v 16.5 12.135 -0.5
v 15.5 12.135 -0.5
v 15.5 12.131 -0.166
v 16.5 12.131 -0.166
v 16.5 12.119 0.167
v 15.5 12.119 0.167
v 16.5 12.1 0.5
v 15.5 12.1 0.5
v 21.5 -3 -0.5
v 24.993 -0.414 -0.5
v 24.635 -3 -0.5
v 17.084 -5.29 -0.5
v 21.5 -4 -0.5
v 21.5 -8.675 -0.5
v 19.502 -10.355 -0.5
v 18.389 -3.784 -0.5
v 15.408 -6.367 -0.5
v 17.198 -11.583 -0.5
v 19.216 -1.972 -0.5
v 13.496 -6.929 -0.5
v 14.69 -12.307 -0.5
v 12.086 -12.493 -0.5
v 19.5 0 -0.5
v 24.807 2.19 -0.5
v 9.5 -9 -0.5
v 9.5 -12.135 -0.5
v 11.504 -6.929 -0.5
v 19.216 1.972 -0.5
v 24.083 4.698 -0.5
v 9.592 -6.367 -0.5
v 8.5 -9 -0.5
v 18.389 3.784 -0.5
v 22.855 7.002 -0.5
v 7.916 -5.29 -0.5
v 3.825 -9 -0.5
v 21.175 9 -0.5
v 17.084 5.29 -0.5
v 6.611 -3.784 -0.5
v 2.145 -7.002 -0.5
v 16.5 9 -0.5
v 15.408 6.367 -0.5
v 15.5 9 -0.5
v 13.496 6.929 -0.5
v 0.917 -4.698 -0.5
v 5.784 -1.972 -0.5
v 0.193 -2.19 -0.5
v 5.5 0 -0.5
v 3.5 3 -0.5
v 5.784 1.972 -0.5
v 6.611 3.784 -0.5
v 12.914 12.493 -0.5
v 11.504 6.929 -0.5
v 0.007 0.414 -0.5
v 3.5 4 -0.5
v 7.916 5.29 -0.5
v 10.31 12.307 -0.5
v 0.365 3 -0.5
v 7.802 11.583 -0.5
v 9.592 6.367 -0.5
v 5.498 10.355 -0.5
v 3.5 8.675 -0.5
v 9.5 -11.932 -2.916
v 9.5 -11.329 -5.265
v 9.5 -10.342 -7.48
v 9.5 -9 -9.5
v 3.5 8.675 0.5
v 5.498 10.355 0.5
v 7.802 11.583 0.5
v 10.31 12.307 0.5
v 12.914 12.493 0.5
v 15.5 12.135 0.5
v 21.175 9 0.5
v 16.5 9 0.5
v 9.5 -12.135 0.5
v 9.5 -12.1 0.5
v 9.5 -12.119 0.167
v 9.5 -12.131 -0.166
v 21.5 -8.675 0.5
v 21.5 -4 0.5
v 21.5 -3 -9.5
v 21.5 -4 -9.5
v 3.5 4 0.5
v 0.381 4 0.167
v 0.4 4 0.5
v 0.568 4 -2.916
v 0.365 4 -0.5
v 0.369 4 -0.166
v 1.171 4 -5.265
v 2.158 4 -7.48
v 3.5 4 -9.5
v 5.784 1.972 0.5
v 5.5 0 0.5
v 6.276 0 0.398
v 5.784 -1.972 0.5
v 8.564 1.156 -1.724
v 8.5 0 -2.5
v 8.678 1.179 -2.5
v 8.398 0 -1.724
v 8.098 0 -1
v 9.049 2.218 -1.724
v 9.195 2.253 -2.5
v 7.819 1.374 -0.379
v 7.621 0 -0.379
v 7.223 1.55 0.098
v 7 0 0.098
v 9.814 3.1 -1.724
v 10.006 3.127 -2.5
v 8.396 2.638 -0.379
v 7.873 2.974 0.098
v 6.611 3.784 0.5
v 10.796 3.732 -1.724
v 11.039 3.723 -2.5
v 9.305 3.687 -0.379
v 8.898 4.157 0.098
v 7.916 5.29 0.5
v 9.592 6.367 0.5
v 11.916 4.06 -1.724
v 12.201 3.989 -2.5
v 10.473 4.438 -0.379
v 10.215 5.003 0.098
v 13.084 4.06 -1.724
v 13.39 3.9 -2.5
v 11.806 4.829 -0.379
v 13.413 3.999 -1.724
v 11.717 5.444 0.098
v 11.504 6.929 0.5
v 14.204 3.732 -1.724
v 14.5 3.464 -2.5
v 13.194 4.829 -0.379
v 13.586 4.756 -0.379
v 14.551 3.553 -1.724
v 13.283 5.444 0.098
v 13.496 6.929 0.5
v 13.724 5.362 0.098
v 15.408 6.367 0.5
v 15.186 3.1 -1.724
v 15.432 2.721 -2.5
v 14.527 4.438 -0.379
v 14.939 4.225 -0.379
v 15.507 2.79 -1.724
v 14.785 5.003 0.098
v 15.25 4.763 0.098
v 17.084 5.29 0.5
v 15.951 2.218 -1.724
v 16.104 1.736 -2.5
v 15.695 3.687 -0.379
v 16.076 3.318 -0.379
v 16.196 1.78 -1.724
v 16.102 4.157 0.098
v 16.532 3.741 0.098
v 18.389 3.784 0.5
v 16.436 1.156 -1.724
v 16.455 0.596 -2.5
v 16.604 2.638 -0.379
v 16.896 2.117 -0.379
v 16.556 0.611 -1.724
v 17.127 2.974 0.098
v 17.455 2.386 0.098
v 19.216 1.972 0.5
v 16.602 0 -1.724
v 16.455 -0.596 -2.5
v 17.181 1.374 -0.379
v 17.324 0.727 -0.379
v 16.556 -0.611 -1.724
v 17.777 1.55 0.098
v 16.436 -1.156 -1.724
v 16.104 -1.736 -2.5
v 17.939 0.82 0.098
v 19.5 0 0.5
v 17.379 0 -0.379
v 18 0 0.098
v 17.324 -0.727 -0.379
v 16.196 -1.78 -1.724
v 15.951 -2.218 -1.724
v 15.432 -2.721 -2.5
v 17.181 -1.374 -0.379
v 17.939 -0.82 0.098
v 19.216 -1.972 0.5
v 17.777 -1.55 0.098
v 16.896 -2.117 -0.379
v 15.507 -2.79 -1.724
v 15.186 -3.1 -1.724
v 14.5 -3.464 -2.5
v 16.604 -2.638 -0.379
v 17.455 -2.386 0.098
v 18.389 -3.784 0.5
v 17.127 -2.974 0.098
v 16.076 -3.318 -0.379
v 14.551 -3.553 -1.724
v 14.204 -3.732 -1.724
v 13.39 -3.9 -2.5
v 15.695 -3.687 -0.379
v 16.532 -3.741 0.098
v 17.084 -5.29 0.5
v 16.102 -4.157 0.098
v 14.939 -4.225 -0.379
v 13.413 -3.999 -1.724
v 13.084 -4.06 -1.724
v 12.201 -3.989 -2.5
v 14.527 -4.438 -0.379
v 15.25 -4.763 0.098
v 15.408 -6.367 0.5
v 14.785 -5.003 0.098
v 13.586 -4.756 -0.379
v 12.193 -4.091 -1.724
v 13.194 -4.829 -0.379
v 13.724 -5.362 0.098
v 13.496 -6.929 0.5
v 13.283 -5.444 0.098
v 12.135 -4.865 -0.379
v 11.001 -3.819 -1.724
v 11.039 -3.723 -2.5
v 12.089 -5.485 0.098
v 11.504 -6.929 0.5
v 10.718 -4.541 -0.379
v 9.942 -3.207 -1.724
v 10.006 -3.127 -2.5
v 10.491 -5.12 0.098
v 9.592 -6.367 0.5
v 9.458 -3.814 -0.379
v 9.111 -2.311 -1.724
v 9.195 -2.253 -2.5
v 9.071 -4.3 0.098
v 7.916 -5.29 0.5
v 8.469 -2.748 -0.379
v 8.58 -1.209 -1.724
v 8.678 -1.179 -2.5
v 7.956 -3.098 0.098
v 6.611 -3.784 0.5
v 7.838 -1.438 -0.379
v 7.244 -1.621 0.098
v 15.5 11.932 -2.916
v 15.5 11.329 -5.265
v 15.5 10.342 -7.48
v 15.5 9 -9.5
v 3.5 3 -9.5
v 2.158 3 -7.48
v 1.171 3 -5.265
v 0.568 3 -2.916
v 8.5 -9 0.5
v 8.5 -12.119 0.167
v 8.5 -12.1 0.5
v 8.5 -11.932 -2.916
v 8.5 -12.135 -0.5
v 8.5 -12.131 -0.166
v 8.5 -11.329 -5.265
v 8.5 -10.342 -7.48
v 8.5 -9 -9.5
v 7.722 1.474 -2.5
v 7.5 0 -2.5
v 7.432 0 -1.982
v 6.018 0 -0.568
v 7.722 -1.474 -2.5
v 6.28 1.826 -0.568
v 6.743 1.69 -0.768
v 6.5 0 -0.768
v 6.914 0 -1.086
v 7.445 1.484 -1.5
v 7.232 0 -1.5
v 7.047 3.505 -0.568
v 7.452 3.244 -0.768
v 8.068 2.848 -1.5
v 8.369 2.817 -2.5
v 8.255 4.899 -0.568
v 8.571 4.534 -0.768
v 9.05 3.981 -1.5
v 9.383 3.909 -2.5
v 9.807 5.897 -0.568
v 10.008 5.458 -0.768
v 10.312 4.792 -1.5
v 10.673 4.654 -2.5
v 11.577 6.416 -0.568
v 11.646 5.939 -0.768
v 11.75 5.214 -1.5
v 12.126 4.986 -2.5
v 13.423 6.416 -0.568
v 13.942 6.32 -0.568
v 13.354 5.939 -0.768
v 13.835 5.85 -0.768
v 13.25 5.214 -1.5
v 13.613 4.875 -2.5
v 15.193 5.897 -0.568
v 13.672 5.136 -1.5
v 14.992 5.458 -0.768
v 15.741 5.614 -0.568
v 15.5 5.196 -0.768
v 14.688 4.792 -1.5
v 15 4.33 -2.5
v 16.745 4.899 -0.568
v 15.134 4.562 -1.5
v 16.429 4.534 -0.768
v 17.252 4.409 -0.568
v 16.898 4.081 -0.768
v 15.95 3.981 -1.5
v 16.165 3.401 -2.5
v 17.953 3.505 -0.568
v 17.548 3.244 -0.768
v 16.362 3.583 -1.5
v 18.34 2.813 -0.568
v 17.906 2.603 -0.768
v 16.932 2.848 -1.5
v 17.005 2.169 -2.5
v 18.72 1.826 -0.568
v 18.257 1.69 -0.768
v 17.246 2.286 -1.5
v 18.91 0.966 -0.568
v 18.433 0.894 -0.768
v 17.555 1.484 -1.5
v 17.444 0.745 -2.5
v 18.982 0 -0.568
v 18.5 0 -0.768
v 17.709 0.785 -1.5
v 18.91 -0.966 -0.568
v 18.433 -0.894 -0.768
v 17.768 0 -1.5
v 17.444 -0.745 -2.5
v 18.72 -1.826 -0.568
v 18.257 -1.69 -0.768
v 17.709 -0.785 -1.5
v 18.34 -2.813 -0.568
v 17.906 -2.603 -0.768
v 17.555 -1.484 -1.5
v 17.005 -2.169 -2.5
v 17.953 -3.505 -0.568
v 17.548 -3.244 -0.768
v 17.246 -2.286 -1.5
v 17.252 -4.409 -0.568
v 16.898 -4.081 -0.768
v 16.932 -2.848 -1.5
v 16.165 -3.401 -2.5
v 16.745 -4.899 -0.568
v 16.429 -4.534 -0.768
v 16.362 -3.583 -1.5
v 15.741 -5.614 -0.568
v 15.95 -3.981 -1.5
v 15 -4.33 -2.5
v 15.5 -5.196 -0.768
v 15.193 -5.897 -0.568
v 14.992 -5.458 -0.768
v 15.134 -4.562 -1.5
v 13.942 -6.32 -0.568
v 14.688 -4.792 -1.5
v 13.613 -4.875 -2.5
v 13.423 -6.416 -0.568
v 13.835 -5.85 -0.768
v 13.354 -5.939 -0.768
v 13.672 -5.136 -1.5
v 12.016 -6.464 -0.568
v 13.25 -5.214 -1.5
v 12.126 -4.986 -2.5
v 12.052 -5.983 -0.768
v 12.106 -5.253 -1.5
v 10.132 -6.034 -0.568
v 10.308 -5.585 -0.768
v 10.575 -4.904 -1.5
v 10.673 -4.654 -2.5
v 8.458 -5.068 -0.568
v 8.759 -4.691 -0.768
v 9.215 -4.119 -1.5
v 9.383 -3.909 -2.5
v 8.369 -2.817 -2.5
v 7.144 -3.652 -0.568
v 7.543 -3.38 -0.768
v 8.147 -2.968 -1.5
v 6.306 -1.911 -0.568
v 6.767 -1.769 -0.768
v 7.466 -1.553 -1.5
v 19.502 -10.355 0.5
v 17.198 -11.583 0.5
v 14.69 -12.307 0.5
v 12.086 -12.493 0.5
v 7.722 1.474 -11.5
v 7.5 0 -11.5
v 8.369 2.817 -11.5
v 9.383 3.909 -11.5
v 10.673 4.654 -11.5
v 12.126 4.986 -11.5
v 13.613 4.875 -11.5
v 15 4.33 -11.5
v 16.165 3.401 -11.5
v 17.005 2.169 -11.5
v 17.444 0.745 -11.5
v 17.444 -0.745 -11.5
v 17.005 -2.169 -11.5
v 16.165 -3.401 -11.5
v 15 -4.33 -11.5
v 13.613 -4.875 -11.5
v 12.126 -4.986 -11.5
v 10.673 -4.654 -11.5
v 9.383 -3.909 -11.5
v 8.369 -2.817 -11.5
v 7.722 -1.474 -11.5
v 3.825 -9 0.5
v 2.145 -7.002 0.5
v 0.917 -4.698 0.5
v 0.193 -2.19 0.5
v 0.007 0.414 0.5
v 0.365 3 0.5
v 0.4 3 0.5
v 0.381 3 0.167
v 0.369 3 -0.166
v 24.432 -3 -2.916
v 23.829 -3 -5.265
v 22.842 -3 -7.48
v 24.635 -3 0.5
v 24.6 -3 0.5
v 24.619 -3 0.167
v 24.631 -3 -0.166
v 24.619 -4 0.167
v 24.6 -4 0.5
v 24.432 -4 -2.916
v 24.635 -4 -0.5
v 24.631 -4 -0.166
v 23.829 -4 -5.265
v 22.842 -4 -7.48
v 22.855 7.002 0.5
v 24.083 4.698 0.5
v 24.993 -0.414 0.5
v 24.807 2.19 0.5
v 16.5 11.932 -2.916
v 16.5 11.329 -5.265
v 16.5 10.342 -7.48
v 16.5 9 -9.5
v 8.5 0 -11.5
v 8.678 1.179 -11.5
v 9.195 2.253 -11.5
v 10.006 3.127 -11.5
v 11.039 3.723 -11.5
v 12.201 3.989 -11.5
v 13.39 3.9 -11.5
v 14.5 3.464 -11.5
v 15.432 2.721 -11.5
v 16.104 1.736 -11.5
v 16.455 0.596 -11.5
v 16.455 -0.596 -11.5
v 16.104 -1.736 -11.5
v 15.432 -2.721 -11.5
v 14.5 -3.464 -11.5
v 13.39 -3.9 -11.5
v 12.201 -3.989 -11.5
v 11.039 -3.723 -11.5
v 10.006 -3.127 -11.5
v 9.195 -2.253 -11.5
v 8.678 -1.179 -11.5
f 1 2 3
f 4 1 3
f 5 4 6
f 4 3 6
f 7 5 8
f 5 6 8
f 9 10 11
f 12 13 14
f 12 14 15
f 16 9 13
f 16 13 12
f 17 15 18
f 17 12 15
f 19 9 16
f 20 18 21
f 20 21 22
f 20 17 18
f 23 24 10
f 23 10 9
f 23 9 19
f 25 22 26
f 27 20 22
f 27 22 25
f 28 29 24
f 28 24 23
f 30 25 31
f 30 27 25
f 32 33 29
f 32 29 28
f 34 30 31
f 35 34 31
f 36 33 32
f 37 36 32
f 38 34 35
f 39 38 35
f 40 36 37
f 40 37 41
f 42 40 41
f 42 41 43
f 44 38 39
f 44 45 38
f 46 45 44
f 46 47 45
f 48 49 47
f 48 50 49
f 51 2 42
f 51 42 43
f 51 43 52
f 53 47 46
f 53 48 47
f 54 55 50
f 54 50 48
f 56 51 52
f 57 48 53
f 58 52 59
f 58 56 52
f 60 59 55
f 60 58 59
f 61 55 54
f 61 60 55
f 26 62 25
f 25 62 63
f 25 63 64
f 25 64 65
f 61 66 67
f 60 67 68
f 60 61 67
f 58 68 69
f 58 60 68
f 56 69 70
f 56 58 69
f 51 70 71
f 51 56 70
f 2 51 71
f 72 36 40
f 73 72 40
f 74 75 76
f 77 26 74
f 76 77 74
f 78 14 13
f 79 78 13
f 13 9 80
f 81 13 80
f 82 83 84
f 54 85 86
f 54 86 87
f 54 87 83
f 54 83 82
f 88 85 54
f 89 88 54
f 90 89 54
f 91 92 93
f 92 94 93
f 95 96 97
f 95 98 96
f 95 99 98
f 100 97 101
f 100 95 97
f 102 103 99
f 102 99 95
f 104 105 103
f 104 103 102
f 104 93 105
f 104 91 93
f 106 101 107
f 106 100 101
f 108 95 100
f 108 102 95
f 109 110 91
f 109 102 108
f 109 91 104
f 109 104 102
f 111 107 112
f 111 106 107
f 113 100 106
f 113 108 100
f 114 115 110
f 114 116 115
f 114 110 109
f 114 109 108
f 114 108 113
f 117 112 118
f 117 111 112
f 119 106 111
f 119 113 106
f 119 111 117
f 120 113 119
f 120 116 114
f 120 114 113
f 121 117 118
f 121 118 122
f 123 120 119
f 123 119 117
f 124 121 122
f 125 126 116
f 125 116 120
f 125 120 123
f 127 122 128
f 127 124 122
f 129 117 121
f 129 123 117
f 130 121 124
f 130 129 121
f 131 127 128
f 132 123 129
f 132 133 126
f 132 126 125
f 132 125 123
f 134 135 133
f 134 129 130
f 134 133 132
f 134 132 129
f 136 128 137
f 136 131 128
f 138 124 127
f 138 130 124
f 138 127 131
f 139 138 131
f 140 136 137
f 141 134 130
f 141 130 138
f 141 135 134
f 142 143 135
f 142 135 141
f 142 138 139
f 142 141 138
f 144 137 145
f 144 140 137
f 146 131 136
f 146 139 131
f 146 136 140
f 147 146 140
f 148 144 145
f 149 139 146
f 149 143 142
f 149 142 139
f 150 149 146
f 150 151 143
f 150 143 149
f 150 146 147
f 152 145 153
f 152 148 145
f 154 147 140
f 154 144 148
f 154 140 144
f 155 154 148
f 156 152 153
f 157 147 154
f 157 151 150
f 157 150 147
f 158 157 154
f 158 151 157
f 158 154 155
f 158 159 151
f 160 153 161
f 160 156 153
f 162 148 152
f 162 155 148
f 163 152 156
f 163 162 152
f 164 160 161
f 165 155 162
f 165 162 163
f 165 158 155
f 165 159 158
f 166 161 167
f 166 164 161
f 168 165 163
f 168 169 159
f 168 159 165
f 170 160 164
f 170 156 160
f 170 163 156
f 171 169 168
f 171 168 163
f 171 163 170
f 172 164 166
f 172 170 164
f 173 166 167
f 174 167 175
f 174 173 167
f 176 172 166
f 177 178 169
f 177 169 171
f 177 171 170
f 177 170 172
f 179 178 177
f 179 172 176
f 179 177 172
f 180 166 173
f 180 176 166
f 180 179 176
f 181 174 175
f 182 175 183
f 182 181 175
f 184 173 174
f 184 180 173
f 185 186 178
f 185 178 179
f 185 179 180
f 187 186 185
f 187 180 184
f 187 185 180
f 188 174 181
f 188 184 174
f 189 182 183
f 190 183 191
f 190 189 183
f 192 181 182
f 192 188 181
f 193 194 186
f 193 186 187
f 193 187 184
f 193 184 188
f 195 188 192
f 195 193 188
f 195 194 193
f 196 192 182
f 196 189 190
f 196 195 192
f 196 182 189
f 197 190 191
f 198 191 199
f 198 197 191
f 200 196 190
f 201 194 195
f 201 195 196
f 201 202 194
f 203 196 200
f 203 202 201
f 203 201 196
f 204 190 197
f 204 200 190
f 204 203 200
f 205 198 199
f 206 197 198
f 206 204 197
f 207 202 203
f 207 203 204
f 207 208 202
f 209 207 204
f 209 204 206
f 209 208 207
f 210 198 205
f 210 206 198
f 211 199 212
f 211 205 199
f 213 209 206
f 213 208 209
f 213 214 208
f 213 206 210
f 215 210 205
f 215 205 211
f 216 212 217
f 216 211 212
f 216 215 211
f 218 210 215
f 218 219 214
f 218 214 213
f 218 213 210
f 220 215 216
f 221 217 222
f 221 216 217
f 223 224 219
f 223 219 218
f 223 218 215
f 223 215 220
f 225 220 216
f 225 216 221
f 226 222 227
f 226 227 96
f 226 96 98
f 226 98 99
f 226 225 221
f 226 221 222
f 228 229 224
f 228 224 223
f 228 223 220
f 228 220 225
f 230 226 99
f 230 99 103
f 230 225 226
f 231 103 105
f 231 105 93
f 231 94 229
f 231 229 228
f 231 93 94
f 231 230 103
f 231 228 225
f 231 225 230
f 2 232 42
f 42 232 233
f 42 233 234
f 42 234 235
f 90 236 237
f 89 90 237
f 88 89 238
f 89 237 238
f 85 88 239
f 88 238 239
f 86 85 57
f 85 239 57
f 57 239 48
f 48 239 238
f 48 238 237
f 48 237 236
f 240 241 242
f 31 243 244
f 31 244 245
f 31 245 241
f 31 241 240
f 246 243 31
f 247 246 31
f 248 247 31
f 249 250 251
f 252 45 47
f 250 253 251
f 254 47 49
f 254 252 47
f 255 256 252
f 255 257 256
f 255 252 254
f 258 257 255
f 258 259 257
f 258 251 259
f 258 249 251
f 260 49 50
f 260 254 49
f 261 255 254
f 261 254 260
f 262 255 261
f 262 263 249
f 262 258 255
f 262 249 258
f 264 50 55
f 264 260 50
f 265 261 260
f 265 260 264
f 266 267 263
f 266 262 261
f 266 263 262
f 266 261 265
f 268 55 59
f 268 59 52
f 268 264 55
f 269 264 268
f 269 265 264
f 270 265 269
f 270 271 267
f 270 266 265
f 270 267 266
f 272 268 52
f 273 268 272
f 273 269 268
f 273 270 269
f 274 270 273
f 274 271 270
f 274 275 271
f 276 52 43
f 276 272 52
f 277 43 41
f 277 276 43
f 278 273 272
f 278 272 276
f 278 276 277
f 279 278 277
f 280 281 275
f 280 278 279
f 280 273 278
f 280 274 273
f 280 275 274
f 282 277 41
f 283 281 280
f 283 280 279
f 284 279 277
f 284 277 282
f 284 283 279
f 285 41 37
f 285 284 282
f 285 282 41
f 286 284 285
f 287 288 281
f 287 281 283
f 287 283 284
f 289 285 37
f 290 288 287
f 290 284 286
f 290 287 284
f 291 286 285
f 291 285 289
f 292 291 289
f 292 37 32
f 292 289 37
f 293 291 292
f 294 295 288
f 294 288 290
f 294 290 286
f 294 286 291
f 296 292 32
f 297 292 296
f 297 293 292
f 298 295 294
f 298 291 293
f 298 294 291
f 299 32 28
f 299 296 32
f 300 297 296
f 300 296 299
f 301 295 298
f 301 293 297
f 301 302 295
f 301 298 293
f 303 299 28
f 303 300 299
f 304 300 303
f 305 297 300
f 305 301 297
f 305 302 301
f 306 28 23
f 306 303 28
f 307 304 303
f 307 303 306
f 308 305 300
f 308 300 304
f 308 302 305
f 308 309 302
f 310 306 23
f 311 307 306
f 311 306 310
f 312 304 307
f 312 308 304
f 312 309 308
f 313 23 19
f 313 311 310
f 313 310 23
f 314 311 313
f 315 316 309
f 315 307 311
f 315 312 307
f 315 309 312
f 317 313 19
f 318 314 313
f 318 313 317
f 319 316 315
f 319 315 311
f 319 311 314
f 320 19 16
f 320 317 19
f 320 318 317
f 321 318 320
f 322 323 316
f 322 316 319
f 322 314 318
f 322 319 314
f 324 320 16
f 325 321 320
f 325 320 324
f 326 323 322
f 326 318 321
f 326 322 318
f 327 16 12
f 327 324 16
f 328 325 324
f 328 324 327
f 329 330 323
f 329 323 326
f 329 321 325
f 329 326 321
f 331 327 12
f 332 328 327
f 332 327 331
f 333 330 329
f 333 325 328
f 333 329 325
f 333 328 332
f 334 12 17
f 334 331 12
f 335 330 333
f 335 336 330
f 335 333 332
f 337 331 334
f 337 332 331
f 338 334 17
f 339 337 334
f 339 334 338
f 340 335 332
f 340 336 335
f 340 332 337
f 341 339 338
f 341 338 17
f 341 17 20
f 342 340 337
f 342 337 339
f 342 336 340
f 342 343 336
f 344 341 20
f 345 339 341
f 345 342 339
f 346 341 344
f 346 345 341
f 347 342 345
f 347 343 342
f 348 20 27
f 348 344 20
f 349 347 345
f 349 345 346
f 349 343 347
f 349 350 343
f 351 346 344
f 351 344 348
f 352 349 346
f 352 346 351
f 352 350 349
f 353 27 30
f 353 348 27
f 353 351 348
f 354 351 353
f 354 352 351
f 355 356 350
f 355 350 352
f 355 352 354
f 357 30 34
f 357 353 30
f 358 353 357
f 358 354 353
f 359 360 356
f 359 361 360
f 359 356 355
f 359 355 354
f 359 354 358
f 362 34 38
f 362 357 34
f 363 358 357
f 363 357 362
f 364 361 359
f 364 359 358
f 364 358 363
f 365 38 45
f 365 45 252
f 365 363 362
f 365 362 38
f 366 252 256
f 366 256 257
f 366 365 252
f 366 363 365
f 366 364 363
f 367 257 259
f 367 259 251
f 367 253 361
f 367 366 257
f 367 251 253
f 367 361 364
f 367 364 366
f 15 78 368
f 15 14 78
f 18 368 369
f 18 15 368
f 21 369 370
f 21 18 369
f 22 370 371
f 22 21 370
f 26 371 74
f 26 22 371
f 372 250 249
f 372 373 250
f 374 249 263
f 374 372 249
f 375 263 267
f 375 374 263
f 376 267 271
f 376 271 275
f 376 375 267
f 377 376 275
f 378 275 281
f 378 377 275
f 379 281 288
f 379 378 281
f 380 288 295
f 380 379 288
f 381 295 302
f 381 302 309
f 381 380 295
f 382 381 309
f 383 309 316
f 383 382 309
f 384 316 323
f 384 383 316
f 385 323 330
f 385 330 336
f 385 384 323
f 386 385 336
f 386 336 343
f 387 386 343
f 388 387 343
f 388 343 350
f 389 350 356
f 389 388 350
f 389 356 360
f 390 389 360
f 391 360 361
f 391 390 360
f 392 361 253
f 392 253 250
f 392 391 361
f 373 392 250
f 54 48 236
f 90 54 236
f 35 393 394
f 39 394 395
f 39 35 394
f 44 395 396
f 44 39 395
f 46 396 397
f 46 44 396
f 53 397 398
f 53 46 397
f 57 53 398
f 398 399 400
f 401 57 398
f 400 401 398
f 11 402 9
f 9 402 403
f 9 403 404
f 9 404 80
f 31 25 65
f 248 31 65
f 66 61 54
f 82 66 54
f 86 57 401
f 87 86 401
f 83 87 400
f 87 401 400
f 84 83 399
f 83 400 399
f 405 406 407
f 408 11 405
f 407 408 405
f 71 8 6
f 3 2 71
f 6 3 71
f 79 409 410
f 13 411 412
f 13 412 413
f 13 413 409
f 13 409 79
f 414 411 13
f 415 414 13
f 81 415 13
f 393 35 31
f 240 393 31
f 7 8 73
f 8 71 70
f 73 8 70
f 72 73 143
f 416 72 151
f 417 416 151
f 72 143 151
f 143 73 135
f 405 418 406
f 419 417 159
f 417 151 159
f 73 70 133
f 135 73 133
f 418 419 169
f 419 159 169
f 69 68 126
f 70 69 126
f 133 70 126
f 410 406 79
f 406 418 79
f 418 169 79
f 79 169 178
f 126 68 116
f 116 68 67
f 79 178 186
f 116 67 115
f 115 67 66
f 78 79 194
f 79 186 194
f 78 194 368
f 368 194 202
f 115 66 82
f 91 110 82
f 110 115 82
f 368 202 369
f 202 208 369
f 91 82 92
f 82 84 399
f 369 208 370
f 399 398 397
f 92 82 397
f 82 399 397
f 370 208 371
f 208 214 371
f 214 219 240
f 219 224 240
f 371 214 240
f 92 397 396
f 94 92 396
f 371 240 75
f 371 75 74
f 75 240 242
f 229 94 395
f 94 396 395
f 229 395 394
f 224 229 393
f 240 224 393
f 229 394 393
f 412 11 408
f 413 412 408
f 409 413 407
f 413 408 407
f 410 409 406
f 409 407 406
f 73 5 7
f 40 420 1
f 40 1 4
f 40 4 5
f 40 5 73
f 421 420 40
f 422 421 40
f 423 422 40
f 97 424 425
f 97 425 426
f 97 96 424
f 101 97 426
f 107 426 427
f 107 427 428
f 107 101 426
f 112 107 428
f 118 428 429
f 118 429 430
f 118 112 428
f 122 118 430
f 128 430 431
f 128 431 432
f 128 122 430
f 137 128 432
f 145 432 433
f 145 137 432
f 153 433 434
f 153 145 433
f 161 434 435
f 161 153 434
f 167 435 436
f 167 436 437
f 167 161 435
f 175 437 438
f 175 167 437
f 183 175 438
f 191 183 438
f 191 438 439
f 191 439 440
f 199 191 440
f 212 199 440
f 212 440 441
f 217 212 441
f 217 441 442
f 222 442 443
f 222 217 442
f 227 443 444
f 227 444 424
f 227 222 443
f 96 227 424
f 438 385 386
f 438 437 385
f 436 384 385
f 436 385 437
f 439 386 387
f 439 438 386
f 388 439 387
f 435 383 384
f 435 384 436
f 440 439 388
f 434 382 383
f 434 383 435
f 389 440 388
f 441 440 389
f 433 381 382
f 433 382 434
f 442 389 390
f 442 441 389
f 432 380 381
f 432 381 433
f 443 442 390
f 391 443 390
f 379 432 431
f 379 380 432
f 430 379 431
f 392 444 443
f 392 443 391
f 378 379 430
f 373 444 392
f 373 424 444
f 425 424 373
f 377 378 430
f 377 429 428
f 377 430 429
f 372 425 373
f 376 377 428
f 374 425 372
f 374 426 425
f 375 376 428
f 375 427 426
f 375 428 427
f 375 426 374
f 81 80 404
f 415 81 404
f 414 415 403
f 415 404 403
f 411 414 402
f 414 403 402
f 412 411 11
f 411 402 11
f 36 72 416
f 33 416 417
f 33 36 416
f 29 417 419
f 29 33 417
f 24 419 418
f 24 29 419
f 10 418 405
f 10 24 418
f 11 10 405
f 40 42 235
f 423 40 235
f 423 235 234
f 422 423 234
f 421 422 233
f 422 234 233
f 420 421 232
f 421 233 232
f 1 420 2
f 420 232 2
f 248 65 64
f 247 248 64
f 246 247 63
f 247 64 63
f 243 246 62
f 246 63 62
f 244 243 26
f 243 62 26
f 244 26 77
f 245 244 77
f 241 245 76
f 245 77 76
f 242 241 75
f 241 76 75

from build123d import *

# Parameters (mm, degrees)
CUT_EXTRUDE1_DEPTH      = 12
CUT_EXTRUDE1_DEPTH_BACK = 2
BOSS_EXTRUDE1_DEPTH     = 1
CIRPATTERN4_COUNT       = 4


with BuildPart() as part:
    # Sketch1 → Revolve1 (revolve)
    with BuildSketch(Plane(origin=(0, 0, 0), x_dir=(1, 0, 0), z_dir=(0, 1, 0))):
        with BuildLine():
            Line((8.5, 7.032838072), (8.5, 2.5))
            ThreePointArc((8.5, 2.5), (7.621320344, 0.378679656), (5.5, -0.5))
            Line((5.5, -0.5), (0, -0.5))
            Line((0, -0.5), (0, 0.5))
            Line((0, 0.5), (5.5, 0.5))
            ThreePointArc((5.5, 0.5), (6.914213562, 1.085786438), (7.5, 2.5))
            Line((7.5, 2.5), (7.5, 11.5))
            Line((7.5, 11.5), (8.5, 11.5))
            Line((8.5, 11.5), (8.5, 7.032838072))
        make_face()
    revolve(axis=Axis((12.5, 0, 0), (0, 0, -1)))

    # Sketch2 → Cut-Extrude1 (cut, two sides)
    with BuildSketch(Plane(origin=(0, 0, -0.5), x_dir=(-1, 0, 0), z_dir=(0, 0, -1))) as cut_extrude1_sk:
        with BuildLine():
            Line((-3.5, 8.674675786), (-3.5, 3))
            Line((-3.5, 3), (-0.3653389, 3))
            ThreePointArc((-0.3653389, 3), (-1.558383974, 6.044091225), (-3.5, 8.674675786))
        make_face()
        with BuildLine():
            Line((-3.825324214, -9), (-9.5, -9))
            Line((-9.5, -9), (-9.5, -12.1346611))
            ThreePointArc((-9.5, -12.1346611), (-6.455908775, -10.941616026), (-3.825324214, -9))
        make_face()
        with BuildLine():
            Line((-21.5, -8.674675786), (-21.5, -3))
            Line((-21.5, -3), (-24.6346611, -3))
            ThreePointArc((-24.6346611, -3), (-23.441616026, -6.044091225), (-21.5, -8.674675786))
        make_face()
        with BuildLine():
            Line((-21.174675786, 9), (-15.5, 9))
            Line((-15.5, 9), (-15.5, 12.1346611))
            ThreePointArc((-15.5, 12.1346611), (-18.544091225, 10.941616026), (-21.174675786, 9))
        make_face()
    extrude(amount=CUT_EXTRUDE1_DEPTH, mode=Mode.SUBTRACT)
    extrude(cut_extrude1_sk.sketch, amount=-CUT_EXTRUDE1_DEPTH_BACK, mode=Mode.SUBTRACT)

    # Sketch3 → Boss-Extrude1 (add)
    with BuildSketch(Plane(origin=(0, 3, 0), x_dir=(1, 0, 0), z_dir=(0, 1, 0))):
        with BuildLine():
            Line((0.3653389, 0.5), (3.5, 0.5))
            Line((3.5, 0.5), (3.5, 9.5))
            ThreePointArc((3.5, 9.5), (1.171429987, 5.265136415), (0.3653389, 0.5))
        make_face()
        with BuildLine():
            Line((3.5, -0.5), (3.5, 0.5))
            Line((3.5, 0.5), (0.3653389, 0.5))
            ThreePointArc((0.3653389, 0.5), (0.373979974, -0.000298405), (0.399892887, -0.5))
            Line((0.399892887, -0.5), (3.5, -0.5))
        make_face()
    boss_extrude1 = extrude(amount=BOSS_EXTRUDE1_DEPTH)

    # CirPattern4: Boss-Extrude1 ×4 about axis
    cirpattern4_axis = Axis((12.5, 0, 0), (0, 0, 1))
    for i in range(1, CIRPATTERN4_COUNT):
        add(boss_extrude1.rotate(cirpattern4_axis, i * 360 / CIRPATTERN4_COUNT))


solid = part.part
